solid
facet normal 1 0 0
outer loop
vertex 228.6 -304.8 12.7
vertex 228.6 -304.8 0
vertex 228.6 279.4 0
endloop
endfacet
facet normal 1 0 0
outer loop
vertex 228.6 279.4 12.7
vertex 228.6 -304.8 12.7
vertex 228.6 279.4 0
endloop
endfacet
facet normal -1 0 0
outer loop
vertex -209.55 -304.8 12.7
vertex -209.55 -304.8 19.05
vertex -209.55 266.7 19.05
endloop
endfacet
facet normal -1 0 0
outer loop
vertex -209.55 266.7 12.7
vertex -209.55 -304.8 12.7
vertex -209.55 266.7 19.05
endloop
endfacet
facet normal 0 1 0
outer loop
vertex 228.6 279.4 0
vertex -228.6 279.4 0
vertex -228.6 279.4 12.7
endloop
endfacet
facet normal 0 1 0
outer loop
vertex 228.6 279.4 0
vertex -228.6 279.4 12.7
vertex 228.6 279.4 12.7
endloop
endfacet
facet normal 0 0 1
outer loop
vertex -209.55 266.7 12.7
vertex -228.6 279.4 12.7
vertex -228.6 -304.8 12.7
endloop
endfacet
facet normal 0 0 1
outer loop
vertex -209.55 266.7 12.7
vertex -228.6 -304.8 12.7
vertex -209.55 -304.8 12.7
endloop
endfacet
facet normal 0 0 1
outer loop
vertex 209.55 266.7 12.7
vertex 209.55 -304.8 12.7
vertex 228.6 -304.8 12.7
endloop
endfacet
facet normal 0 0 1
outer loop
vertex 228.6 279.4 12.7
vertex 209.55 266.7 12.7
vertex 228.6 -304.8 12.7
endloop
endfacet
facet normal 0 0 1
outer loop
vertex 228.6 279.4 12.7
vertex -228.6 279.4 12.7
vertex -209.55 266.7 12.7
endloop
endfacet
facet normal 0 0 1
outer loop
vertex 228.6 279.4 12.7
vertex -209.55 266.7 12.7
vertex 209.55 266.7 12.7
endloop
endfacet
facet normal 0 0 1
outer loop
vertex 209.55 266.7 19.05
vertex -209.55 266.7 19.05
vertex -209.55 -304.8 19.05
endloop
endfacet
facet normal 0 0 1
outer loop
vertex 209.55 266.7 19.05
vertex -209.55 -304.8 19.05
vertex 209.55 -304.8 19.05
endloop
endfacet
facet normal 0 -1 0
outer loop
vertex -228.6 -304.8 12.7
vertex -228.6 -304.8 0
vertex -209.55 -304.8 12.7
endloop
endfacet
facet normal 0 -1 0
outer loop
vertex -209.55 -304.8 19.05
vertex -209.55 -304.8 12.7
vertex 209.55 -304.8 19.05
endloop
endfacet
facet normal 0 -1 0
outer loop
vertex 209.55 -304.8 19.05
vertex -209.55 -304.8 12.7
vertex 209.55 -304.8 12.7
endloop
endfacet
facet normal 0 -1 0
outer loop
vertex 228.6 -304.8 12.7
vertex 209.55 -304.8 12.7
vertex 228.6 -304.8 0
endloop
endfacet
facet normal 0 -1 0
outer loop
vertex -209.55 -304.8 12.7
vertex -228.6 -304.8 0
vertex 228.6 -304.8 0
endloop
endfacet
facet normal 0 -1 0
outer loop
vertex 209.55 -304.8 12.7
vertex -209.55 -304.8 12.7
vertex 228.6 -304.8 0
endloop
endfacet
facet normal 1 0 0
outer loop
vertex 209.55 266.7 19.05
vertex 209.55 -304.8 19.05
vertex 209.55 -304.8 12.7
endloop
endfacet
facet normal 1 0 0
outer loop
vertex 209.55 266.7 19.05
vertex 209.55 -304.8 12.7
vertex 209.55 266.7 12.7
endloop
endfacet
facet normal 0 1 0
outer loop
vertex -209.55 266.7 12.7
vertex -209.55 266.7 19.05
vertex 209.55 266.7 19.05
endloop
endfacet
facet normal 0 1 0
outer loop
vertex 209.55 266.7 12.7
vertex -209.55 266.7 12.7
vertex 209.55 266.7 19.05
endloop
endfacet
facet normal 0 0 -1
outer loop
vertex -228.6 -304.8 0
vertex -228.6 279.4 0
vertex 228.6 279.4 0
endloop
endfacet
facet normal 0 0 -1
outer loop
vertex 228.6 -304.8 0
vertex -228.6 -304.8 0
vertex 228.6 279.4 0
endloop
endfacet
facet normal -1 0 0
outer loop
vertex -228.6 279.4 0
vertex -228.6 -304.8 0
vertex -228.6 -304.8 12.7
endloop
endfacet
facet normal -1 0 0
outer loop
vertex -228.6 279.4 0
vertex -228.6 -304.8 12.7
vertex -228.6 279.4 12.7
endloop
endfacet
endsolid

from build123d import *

# Parameters (mm, degrees)
F0_W     = 457.2
F0_H     = 584.2
F1_DEPTH = 19.05
F2_W     = 19.05
F2_H     = 584.2
F3_DEPTH = 6.35
F4_W     = 419.1
F4_H     = 12.7
F5_DEPTH = 6.35


with BuildPart() as f1:
    # F0 (on Top) → F1 (new body)
    with BuildSketch(Plane.XY):
        with Locations((0, -12.7)):
            Rectangle(F0_W, F0_H)
    extrude(amount=F1_DEPTH)

    # F2 (on face) → F3 (cut)
    with BuildSketch(Plane.XY.offset(19.05)):
        with Locations((219.075, -12.7)):
            Rectangle(F2_W, F2_H)
        with Locations((-219.075, -12.7)):
            Rectangle(F2_W, F2_H)
    extrude(amount=-F3_DEPTH, mode=Mode.SUBTRACT)

    # F4 (on face) → F5 (cut)
    with BuildSketch(Plane.XY.offset(19.05)):
        with Locations((0, 273.05)):
            Rectangle(F4_W, F4_H)
    extrude(amount=-F5_DEPTH, mode=Mode.SUBTRACT)


solid = f1.part
